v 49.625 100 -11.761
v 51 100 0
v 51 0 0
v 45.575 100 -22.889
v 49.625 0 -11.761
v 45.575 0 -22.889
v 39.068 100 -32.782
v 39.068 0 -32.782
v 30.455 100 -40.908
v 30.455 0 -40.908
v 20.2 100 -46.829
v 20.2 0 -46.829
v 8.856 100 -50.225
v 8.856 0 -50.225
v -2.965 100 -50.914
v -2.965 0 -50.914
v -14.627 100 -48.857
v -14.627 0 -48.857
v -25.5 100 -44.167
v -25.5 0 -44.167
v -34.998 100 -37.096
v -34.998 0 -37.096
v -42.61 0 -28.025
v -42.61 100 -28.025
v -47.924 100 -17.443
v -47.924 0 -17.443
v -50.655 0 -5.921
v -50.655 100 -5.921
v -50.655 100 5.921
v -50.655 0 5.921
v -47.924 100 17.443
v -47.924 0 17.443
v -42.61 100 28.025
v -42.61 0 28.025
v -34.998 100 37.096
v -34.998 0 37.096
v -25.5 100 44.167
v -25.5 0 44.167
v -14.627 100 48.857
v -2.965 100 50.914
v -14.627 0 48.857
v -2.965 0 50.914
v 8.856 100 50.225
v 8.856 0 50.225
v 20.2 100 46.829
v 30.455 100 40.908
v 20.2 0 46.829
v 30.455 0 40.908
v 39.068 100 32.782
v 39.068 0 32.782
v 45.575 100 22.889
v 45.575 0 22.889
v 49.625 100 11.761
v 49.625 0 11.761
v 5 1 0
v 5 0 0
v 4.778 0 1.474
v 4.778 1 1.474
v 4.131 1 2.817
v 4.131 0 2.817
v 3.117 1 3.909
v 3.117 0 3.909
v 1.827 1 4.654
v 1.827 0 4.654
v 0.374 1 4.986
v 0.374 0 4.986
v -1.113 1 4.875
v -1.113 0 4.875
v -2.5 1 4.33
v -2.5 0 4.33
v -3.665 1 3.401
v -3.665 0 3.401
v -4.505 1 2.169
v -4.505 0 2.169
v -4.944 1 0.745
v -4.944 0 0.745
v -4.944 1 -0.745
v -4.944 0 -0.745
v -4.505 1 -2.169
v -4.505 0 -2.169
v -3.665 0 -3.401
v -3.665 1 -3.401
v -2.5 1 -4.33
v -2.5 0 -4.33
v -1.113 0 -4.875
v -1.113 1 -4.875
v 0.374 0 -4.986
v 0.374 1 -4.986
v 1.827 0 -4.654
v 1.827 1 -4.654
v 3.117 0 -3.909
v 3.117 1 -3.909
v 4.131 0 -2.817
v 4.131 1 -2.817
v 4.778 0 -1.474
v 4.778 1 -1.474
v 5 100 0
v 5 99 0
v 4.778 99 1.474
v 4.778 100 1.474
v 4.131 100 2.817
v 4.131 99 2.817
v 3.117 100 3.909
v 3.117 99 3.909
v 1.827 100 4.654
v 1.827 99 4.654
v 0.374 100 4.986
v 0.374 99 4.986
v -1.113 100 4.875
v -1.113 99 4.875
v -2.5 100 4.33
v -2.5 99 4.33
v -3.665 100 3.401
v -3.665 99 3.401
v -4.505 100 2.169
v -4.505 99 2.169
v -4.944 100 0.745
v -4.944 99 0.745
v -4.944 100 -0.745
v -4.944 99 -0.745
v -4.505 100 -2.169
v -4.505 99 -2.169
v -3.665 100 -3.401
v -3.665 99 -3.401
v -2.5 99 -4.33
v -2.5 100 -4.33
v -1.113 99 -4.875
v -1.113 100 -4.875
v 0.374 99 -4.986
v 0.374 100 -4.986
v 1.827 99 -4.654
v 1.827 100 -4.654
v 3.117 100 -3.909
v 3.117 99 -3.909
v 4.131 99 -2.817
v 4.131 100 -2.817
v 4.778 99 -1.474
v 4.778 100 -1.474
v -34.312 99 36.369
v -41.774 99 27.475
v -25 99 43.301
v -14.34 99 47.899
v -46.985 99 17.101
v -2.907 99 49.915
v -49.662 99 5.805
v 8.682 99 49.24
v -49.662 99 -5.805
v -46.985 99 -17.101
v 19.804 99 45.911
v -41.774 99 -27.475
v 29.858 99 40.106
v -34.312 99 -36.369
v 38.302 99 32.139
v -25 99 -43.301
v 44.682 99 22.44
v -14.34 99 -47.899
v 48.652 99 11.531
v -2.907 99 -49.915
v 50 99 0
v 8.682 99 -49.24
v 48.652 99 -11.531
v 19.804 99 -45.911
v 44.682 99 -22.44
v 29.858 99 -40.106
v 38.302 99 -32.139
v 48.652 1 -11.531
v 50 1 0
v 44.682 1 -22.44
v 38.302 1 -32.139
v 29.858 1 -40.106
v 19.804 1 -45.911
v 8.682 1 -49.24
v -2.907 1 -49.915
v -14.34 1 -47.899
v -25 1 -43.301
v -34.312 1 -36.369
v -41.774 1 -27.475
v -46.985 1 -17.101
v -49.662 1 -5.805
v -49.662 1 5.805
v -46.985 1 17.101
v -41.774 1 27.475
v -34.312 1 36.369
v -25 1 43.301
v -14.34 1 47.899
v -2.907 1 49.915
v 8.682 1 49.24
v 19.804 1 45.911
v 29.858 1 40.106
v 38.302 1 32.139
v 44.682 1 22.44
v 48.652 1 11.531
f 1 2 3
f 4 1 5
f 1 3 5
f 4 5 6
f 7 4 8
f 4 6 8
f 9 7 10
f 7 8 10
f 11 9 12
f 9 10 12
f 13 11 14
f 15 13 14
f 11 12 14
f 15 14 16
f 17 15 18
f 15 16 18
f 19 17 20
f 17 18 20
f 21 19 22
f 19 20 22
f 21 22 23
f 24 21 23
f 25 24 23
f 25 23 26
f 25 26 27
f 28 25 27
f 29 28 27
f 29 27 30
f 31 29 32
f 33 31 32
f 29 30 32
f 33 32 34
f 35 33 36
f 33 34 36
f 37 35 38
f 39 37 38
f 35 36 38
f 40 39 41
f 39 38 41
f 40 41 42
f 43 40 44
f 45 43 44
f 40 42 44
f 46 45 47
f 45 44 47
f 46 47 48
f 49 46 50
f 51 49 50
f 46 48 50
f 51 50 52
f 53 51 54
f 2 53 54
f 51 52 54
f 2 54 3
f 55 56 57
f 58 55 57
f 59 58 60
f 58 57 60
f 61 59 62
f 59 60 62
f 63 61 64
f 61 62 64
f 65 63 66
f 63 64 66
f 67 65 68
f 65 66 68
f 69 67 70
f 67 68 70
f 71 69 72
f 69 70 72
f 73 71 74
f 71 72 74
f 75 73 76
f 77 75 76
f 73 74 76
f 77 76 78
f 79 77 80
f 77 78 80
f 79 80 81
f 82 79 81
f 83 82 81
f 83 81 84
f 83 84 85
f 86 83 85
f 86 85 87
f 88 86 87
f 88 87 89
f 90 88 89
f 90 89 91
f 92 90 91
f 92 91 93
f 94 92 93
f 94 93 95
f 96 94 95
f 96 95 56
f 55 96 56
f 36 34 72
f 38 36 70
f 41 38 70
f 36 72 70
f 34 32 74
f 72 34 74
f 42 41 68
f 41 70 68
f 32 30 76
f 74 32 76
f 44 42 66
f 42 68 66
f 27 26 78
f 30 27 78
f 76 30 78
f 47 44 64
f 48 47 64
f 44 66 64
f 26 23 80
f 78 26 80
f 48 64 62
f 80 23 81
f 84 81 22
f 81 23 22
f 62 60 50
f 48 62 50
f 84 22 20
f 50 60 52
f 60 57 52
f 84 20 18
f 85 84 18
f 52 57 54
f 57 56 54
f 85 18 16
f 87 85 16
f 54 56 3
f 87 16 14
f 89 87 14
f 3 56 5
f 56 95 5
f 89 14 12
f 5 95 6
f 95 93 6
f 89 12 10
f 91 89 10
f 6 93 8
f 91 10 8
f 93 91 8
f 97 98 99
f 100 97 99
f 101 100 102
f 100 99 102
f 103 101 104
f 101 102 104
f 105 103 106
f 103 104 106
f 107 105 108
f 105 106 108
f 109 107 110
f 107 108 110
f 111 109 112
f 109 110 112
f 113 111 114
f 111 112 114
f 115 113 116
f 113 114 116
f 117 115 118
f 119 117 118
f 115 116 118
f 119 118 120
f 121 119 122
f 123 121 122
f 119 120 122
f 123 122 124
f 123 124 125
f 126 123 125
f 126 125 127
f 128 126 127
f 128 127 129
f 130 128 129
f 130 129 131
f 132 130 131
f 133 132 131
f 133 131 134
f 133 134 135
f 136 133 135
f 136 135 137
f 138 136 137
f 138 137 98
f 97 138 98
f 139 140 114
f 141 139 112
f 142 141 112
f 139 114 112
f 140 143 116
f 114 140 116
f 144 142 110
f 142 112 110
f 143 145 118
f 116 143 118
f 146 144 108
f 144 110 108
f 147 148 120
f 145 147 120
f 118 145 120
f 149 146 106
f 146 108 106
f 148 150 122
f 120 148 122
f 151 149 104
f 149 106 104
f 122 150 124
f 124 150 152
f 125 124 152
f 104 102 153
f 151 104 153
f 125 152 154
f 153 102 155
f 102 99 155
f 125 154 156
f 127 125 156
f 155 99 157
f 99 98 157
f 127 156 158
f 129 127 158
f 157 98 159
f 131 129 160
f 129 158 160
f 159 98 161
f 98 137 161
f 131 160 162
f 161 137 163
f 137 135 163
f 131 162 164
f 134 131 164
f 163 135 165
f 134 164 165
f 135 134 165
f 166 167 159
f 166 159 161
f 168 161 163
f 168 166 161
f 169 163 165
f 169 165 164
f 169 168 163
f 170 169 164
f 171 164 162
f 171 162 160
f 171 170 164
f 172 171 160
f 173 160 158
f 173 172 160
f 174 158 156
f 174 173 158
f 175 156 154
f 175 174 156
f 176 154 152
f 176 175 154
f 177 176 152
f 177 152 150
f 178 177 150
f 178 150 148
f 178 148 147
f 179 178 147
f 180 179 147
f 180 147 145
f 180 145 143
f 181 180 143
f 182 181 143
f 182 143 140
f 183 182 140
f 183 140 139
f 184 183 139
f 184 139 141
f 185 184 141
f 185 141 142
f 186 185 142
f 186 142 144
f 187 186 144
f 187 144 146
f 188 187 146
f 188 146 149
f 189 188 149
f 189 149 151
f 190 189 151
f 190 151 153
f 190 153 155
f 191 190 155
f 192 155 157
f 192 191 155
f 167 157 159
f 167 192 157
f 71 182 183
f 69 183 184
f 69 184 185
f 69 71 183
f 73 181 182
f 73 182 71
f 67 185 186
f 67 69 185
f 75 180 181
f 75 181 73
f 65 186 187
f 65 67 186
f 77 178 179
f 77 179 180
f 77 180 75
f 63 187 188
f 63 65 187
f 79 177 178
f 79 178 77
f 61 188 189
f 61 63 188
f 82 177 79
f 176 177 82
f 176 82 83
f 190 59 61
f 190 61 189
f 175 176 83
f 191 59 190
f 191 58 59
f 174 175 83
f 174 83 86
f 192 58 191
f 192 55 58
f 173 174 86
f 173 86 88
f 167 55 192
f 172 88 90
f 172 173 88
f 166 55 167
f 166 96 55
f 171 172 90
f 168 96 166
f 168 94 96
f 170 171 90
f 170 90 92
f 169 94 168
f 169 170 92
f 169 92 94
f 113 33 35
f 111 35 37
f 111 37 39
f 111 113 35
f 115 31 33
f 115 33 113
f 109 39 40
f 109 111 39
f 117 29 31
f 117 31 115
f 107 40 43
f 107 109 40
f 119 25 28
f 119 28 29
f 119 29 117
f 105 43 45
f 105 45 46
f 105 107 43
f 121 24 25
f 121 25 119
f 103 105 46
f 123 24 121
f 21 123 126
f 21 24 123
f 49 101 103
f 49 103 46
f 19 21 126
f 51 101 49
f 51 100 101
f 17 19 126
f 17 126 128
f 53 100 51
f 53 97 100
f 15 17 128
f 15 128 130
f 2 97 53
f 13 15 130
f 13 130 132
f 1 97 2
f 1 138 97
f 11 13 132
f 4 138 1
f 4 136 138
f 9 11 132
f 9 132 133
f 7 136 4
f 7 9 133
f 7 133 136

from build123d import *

# Parameters (mm, degrees)
SKETCH1_R           = 51
SKETCH1_R_2         = 50
EXTRUDE_THIN1_DEPTH = 100
SKETCH1_2_R         = 50
BOSS_EXTRUDE1_DEPTH = 1
LPATTERN1_COUNT     = 2
LPATTERN1_PITCH     = 99
SKETCH3_R           = 5
CUT_EXTRUDE1_DEPTH  = 101


with BuildPart() as part:
    # Sketch1 → Extrude-Thin1 (new body)
    with BuildSketch(Plane(origin=(0, 0, 0), x_dir=(1, 0, 0), z_dir=(0, 1, 0))):
        Circle(SKETCH1_R)
        Circle(SKETCH1_R_2, mode=Mode.SUBTRACT)
    extrude(amount=EXTRUDE_THIN1_DEPTH)

    # Sketch1<2> → Boss-Extrude1 (add)
    with BuildSketch(Plane(origin=(0, 0, 0), x_dir=(1, 0, 0), z_dir=(0, 1, 0))):
        Circle(SKETCH1_2_R)
    boss_extrude1 = extrude(amount=BOSS_EXTRUDE1_DEPTH)

    # LPattern1: Boss-Extrude1 ×2
    with Locations(*[(0, i * LPATTERN1_PITCH, 0) for i in range(1, LPATTERN1_COUNT)]):
        add(boss_extrude1)

    # Sketch3 → Cut-Extrude1 (cut, through all)
    with BuildSketch(Plane.XZ):
        Circle(SKETCH3_R)
    extrude(amount=-CUT_EXTRUDE1_DEPTH, mode=Mode.SUBTRACT)


solid = part.part
